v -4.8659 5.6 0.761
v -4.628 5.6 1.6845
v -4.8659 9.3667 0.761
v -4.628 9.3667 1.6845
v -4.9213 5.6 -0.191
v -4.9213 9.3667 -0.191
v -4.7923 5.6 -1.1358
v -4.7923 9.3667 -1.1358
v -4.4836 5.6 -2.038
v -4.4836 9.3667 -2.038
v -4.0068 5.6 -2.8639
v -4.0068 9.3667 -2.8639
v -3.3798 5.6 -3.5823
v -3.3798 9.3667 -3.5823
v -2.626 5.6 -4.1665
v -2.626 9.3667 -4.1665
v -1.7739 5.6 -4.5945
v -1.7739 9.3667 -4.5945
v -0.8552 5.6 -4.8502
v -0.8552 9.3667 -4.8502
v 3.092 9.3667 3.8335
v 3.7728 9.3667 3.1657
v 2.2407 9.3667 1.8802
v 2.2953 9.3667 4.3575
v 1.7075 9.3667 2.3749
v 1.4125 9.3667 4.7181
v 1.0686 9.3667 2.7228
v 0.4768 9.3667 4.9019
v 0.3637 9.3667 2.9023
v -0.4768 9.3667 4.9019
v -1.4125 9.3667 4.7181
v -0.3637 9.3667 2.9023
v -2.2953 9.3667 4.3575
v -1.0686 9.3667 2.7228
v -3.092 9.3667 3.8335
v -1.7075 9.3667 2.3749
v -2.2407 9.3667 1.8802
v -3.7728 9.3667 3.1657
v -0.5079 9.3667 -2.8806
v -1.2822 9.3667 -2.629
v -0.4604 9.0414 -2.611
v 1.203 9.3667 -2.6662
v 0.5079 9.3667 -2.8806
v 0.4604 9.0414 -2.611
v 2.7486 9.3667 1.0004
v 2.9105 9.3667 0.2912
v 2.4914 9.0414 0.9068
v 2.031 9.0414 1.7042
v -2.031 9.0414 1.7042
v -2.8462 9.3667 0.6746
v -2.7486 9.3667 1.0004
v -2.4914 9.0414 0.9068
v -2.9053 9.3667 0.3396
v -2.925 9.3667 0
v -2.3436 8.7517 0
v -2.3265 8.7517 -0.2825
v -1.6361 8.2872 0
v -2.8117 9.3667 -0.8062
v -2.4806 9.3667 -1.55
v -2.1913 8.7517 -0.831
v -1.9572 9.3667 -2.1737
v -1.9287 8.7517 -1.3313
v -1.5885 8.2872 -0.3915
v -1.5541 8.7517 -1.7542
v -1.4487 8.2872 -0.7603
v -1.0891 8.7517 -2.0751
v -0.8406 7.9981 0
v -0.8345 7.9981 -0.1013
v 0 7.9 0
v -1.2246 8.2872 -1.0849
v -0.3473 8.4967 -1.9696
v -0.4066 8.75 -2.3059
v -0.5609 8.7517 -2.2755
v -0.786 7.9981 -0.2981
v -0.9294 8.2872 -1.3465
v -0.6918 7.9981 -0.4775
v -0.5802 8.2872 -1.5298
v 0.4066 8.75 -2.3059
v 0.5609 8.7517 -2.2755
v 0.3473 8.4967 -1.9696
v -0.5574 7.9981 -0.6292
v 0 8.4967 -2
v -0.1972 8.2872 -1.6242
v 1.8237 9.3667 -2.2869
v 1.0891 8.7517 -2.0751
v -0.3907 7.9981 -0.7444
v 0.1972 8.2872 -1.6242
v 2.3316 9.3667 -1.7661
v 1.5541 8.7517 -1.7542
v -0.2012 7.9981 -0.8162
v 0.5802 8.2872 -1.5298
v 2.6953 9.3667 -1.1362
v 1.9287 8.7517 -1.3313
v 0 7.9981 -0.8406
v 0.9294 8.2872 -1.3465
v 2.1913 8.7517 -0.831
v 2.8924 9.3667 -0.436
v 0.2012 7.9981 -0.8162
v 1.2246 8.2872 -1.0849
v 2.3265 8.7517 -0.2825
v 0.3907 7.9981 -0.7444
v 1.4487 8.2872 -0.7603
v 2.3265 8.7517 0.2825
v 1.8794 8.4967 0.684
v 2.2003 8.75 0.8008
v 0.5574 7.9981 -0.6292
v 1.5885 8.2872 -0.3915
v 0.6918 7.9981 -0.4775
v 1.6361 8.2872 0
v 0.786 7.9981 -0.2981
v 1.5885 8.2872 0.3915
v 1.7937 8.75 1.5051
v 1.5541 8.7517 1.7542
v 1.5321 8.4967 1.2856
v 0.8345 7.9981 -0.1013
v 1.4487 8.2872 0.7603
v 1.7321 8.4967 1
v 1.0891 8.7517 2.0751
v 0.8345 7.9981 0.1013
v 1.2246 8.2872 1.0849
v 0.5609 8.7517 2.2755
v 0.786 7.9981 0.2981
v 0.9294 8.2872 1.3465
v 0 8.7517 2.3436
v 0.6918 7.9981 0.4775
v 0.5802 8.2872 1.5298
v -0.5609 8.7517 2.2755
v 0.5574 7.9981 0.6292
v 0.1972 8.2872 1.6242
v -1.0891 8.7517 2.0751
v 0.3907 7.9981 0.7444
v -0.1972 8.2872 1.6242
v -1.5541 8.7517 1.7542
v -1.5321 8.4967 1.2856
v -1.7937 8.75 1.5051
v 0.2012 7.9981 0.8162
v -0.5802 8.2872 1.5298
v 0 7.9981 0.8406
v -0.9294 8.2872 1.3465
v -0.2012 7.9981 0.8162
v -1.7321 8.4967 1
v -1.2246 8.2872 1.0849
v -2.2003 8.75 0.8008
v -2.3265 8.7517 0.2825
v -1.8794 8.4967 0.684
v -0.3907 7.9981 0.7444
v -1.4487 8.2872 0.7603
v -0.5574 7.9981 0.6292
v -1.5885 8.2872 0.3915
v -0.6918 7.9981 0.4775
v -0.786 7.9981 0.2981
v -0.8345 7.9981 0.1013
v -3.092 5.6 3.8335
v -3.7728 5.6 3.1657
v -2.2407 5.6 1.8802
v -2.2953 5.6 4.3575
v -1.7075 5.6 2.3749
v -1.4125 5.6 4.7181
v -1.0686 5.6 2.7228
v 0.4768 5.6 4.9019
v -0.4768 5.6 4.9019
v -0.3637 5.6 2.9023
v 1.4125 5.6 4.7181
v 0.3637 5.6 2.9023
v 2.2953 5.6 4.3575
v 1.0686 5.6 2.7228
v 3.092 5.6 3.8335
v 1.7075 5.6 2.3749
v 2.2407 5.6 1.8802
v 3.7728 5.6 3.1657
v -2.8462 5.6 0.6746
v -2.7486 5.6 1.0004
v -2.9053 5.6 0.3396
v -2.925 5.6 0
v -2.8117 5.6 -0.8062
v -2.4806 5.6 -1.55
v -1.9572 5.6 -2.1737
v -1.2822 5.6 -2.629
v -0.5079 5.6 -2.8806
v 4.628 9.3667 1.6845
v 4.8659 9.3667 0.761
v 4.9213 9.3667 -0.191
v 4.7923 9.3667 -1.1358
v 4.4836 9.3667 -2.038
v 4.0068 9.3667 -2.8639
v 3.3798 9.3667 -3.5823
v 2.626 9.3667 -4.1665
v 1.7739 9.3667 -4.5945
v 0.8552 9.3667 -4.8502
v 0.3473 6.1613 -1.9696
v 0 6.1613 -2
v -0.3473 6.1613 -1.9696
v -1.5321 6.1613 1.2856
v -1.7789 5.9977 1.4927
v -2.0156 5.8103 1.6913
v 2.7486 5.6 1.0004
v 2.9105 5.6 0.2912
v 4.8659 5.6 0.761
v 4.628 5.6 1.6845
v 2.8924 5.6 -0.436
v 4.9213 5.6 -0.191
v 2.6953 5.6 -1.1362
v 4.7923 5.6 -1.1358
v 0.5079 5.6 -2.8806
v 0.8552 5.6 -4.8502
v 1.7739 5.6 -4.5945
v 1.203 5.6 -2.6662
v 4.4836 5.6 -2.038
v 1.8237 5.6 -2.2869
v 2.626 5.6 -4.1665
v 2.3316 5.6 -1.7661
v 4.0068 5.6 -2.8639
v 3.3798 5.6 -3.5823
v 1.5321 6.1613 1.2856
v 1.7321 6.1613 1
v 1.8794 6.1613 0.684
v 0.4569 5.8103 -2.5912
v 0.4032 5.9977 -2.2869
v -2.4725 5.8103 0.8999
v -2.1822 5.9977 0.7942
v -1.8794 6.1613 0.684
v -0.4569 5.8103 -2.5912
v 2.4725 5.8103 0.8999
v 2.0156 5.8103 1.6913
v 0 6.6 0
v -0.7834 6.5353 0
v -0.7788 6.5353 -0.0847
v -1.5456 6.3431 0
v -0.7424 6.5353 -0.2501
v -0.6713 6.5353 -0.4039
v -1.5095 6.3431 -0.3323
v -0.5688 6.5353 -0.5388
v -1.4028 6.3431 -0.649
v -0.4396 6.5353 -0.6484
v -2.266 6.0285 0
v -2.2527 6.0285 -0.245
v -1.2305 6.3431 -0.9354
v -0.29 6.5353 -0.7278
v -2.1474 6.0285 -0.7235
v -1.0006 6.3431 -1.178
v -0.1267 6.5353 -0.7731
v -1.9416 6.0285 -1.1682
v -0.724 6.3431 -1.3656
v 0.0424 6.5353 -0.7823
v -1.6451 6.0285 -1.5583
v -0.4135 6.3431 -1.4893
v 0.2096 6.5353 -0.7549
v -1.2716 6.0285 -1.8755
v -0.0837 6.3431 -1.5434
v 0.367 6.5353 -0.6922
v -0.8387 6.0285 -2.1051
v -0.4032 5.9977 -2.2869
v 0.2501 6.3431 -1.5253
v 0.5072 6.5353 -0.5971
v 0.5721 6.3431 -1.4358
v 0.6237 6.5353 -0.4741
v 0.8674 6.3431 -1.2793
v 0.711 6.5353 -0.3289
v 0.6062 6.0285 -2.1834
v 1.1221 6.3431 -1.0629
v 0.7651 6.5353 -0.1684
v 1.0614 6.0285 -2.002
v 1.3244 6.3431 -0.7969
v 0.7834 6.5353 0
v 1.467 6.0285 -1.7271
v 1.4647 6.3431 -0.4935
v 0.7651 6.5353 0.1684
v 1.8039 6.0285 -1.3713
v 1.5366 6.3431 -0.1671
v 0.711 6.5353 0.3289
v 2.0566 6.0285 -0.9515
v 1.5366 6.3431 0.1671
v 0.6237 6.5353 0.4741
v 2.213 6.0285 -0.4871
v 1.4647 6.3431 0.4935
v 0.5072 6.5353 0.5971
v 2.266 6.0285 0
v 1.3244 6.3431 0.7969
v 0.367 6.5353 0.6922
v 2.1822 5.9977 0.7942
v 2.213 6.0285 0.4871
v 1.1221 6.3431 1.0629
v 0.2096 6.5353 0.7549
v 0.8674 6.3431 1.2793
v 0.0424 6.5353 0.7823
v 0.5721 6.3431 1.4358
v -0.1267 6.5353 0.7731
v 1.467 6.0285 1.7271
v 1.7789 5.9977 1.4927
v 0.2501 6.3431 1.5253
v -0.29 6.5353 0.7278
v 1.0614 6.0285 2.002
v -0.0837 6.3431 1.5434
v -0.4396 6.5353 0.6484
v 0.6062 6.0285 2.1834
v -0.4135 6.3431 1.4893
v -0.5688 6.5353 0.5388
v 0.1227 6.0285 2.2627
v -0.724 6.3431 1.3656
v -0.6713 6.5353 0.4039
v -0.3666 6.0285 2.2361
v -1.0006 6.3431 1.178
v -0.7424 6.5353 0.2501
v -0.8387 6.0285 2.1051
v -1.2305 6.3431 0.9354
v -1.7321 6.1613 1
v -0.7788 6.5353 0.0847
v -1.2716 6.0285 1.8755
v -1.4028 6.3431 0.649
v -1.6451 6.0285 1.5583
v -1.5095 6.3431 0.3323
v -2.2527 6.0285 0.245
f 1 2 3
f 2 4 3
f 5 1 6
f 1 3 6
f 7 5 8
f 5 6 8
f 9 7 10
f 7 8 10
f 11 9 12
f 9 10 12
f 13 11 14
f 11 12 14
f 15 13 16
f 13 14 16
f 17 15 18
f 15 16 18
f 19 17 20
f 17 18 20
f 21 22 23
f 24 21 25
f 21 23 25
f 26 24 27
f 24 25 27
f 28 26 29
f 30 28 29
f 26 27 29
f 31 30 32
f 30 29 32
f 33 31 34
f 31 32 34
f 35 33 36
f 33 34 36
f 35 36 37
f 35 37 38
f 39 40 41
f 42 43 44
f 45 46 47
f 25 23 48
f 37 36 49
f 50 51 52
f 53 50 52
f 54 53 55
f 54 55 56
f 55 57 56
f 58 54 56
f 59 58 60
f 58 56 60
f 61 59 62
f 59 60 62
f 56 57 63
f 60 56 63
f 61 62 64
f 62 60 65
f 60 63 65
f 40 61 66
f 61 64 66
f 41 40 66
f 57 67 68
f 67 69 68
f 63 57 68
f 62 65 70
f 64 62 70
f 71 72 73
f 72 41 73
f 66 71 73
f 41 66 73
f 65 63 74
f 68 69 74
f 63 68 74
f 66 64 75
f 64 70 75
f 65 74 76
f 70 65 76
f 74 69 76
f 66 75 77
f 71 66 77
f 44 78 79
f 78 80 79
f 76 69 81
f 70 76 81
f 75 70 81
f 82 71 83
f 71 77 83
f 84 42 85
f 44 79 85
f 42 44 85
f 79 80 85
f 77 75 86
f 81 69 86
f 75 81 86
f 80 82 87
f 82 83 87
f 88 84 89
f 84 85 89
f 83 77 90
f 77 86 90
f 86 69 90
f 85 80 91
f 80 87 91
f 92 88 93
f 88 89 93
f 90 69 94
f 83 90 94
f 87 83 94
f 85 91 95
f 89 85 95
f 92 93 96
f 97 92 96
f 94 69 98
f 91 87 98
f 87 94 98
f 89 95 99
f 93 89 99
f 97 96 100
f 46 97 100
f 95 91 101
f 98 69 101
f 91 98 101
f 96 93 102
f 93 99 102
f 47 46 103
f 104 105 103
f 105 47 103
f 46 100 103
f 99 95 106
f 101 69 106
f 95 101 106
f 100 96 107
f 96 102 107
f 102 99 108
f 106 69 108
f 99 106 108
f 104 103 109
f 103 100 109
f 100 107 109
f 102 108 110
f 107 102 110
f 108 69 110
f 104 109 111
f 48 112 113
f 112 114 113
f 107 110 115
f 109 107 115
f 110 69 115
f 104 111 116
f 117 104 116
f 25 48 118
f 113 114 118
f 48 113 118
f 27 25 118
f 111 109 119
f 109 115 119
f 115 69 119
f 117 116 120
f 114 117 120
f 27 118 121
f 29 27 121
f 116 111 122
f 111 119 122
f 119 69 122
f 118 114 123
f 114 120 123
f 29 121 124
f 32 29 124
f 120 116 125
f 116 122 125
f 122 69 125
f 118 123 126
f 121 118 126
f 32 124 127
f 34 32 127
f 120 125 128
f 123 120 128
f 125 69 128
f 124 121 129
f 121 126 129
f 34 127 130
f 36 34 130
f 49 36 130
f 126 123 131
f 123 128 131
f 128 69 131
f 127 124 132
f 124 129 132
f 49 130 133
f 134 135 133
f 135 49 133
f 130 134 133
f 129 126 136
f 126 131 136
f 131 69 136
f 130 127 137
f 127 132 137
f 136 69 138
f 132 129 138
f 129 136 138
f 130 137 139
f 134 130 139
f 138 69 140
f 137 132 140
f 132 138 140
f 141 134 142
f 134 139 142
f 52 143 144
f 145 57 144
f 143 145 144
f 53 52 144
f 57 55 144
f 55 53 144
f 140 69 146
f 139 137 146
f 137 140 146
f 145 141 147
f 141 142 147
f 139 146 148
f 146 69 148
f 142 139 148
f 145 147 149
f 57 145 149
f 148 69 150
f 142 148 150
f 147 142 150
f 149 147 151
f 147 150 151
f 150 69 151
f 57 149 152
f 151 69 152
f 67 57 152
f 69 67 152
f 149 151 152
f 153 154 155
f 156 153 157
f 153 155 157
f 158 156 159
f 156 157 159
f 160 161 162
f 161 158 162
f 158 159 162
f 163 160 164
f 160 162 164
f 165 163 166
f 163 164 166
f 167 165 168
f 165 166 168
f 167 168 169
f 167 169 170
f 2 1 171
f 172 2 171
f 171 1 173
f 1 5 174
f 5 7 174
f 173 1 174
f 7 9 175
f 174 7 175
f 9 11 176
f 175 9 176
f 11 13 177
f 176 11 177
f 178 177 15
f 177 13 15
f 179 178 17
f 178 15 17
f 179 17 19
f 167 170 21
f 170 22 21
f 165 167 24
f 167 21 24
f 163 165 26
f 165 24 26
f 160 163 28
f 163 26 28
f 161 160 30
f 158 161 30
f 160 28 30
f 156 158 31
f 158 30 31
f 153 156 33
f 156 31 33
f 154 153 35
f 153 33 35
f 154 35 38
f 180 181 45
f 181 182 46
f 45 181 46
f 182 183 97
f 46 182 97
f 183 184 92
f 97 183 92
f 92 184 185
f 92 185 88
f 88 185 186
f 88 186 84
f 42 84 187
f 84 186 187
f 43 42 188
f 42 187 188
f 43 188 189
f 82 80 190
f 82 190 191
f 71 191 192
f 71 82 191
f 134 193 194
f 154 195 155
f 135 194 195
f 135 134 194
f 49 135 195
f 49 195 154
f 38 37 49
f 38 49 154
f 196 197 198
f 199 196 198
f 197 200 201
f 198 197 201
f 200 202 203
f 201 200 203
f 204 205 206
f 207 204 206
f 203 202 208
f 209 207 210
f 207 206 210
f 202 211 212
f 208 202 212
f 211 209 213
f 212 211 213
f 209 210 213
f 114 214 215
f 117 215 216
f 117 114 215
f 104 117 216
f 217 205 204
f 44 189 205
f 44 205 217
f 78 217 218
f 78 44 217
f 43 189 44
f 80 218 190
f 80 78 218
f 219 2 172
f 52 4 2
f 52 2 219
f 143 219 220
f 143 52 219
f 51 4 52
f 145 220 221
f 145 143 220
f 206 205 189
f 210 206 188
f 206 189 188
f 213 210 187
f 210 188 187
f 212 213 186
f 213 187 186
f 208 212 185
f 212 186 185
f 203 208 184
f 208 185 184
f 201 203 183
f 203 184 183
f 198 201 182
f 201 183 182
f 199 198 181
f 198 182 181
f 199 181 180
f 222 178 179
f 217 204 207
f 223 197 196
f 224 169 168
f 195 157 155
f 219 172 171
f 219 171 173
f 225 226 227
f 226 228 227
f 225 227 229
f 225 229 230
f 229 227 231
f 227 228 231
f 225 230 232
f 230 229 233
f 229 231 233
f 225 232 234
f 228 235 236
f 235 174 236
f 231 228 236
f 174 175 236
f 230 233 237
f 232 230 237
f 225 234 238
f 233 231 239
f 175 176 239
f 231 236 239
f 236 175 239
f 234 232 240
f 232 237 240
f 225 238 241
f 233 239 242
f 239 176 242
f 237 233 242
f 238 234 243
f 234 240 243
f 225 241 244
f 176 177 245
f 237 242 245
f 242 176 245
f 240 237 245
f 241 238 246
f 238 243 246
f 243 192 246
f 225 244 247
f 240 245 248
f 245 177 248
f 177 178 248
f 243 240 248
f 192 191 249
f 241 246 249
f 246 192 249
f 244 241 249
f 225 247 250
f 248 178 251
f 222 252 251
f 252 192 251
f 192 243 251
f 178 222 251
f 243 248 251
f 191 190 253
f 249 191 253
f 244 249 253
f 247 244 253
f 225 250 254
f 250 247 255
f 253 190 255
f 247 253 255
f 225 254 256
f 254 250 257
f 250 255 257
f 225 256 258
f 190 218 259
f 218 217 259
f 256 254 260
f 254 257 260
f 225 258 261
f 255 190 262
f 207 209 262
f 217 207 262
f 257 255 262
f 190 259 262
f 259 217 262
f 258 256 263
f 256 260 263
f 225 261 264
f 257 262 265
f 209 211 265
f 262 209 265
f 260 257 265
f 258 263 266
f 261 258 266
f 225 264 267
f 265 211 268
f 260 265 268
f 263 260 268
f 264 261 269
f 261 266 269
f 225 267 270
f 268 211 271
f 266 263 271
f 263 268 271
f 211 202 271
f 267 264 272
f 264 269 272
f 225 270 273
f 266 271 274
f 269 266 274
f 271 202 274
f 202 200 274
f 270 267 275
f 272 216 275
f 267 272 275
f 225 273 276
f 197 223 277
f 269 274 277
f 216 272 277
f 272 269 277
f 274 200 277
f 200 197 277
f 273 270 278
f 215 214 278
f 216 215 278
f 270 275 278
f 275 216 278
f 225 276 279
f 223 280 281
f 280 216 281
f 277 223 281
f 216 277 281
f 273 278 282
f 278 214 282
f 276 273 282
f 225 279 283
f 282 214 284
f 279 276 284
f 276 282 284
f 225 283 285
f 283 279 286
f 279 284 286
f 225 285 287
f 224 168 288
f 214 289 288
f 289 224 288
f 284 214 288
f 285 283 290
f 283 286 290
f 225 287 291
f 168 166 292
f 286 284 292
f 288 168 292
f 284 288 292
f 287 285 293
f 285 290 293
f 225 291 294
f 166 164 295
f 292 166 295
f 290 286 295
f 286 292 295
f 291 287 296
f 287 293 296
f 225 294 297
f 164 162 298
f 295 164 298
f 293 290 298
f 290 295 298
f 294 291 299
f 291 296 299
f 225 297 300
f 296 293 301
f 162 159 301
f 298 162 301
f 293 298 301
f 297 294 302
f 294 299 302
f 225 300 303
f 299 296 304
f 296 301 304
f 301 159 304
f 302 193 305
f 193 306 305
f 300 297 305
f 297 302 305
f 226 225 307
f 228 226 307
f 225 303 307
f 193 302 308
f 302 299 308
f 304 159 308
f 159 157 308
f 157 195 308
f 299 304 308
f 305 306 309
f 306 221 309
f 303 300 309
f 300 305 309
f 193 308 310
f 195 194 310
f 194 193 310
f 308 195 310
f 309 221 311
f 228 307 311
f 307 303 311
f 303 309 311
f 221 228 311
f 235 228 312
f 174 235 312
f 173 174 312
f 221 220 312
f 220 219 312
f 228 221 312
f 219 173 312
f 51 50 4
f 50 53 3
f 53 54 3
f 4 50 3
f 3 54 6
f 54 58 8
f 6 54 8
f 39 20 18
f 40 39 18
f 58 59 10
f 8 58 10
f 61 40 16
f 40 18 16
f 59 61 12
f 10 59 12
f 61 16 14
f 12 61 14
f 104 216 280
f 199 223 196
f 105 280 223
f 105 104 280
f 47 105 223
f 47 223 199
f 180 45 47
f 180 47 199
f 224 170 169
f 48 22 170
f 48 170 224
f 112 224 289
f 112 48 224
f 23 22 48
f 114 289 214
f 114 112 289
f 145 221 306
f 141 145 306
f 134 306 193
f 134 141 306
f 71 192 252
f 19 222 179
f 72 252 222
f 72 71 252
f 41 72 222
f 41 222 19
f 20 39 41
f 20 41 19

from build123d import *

# Parameters (mm, degrees)
CUT_EXTRUDE_1_DEPTH = 8.918334965


with BuildPart() as part:
    # 草图1 → 旋转2 (revolve)
    with BuildSketch(Plane.XY):
        with BuildLine():
            Line((-2.925029572, 5.6), (-4.925029572, 5.6))
            Line((-4.925029572, 5.6), (-4.925029572, 9.366722189))
            Line((-4.925029572, 9.366722189), (-2.925029572, 9.366722189))
            ThreePointArc((-2.925029572, 9.366722189), (-1.636083126, 8.287220203), (0, 7.9))
            Line((0, 7.9), (0, 6.6))
            ThreePointArc((0, 6.6), (-1.54562269, 6.343093076), (-2.925029572, 5.6))
        make_face()
    revolve(axis=Axis((0, 7.9, 0), (0, -1, 0)))

    # 草图2 → 切除-拉伸1 (cut, through all)
    with BuildSketch(Plane(origin=(0, 9.366722189, 0), x_dir=(1, 0, 0), z_dir=(0, 1, 0))):
        with BuildLine():
            Line((-0.347296355, 1.969615506), (-1.736481777, 9.84807753))
            ThreePointArc((-1.736481777, 9.84807753), (0, 10), (1.736481777, 9.84807753))
            Line((1.736481777, 9.84807753), (0.347296355, 1.969615506))
            ThreePointArc((0.347296355, 1.969615506), (0, 2), (-0.347296355, 1.969615506))
        make_face()
        with BuildLine():
            Line((1.879385242, -0.684040287), (9.396926208, -3.420201433))
            ThreePointArc((9.396926208, -3.420201433), (8.660254038, -5), (7.660444431, -6.427876097))
            Line((7.660444431, -6.427876097), (1.532088886, -1.285575219))
            ThreePointArc((1.532088886, -1.285575219), (1.732050808, -1), (1.879385242, -0.684040287))
        make_face()
        with BuildLine():
            Line((-1.532088886, -1.285575219), (-7.660444431, -6.427876097))
            ThreePointArc((-7.660444431, -6.427876097), (-8.660254038, -5), (-9.396926208, -3.420201433))
            Line((-9.396926208, -3.420201433), (-1.879385242, -0.684040287))
            ThreePointArc((-1.879385242, -0.684040287), (-1.732050808, -1), (-1.532088886, -1.285575219))
        make_face()
    extrude(amount=-CUT_EXTRUDE_1_DEPTH, mode=Mode.SUBTRACT)


solid = part.part
